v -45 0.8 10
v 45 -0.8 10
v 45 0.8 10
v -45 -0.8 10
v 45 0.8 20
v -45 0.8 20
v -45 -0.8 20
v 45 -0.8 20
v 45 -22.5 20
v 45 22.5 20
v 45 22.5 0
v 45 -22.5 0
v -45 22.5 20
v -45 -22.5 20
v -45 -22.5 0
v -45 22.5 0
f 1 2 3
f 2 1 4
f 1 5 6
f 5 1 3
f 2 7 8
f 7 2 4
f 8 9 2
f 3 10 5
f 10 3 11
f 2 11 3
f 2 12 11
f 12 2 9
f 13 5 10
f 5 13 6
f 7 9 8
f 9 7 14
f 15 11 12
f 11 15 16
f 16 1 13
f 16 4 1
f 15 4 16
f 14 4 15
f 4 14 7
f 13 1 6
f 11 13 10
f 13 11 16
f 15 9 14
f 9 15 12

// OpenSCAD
// Microscope slide drying rack
// Print orientation: base block on the bed (z = 0), slots open upward (+Z)

// ---------------- Parameters ----------------
block_len    = 90;    // base block length along X (mm)
block_wid    = 45;    // base block width along Y (mm)
block_h      = 20;    // base block height along Z (mm)

slot_count   = 10;    // number of slide slots
slot_len     = 77;    // slot length along X (mm)
slot_w       = 1.6;   // slot width along Y (mm)
slot_depth   = 10;    // slot depth from top face (mm)
slot_pitch   = 3.5;   // centre-to-centre spacing of slots along Y (mm)

eps          = 0.5;   // overshoot of cutters past the top face (mm)

$fn = 64;

// ---------------- Model ----------------
difference() {
    // Solid base block, centred in X and Y, resting on z = 0
    translate([-block_len/2, -block_wid/2, 0])
        cube([block_len, block_wid, block_h]);

    // Parallel slots running along X, centred as a group in X and Y
    for (i = [0 : slot_count - 1]) {
        x = (i - (slot_count - 1)/2) * slot_pitch;
        translate([x - slot_len/2, -slot_w/2, block_h - slot_depth])
            cube([slot_len, slot_w, slot_depth + eps]);
    }
}
